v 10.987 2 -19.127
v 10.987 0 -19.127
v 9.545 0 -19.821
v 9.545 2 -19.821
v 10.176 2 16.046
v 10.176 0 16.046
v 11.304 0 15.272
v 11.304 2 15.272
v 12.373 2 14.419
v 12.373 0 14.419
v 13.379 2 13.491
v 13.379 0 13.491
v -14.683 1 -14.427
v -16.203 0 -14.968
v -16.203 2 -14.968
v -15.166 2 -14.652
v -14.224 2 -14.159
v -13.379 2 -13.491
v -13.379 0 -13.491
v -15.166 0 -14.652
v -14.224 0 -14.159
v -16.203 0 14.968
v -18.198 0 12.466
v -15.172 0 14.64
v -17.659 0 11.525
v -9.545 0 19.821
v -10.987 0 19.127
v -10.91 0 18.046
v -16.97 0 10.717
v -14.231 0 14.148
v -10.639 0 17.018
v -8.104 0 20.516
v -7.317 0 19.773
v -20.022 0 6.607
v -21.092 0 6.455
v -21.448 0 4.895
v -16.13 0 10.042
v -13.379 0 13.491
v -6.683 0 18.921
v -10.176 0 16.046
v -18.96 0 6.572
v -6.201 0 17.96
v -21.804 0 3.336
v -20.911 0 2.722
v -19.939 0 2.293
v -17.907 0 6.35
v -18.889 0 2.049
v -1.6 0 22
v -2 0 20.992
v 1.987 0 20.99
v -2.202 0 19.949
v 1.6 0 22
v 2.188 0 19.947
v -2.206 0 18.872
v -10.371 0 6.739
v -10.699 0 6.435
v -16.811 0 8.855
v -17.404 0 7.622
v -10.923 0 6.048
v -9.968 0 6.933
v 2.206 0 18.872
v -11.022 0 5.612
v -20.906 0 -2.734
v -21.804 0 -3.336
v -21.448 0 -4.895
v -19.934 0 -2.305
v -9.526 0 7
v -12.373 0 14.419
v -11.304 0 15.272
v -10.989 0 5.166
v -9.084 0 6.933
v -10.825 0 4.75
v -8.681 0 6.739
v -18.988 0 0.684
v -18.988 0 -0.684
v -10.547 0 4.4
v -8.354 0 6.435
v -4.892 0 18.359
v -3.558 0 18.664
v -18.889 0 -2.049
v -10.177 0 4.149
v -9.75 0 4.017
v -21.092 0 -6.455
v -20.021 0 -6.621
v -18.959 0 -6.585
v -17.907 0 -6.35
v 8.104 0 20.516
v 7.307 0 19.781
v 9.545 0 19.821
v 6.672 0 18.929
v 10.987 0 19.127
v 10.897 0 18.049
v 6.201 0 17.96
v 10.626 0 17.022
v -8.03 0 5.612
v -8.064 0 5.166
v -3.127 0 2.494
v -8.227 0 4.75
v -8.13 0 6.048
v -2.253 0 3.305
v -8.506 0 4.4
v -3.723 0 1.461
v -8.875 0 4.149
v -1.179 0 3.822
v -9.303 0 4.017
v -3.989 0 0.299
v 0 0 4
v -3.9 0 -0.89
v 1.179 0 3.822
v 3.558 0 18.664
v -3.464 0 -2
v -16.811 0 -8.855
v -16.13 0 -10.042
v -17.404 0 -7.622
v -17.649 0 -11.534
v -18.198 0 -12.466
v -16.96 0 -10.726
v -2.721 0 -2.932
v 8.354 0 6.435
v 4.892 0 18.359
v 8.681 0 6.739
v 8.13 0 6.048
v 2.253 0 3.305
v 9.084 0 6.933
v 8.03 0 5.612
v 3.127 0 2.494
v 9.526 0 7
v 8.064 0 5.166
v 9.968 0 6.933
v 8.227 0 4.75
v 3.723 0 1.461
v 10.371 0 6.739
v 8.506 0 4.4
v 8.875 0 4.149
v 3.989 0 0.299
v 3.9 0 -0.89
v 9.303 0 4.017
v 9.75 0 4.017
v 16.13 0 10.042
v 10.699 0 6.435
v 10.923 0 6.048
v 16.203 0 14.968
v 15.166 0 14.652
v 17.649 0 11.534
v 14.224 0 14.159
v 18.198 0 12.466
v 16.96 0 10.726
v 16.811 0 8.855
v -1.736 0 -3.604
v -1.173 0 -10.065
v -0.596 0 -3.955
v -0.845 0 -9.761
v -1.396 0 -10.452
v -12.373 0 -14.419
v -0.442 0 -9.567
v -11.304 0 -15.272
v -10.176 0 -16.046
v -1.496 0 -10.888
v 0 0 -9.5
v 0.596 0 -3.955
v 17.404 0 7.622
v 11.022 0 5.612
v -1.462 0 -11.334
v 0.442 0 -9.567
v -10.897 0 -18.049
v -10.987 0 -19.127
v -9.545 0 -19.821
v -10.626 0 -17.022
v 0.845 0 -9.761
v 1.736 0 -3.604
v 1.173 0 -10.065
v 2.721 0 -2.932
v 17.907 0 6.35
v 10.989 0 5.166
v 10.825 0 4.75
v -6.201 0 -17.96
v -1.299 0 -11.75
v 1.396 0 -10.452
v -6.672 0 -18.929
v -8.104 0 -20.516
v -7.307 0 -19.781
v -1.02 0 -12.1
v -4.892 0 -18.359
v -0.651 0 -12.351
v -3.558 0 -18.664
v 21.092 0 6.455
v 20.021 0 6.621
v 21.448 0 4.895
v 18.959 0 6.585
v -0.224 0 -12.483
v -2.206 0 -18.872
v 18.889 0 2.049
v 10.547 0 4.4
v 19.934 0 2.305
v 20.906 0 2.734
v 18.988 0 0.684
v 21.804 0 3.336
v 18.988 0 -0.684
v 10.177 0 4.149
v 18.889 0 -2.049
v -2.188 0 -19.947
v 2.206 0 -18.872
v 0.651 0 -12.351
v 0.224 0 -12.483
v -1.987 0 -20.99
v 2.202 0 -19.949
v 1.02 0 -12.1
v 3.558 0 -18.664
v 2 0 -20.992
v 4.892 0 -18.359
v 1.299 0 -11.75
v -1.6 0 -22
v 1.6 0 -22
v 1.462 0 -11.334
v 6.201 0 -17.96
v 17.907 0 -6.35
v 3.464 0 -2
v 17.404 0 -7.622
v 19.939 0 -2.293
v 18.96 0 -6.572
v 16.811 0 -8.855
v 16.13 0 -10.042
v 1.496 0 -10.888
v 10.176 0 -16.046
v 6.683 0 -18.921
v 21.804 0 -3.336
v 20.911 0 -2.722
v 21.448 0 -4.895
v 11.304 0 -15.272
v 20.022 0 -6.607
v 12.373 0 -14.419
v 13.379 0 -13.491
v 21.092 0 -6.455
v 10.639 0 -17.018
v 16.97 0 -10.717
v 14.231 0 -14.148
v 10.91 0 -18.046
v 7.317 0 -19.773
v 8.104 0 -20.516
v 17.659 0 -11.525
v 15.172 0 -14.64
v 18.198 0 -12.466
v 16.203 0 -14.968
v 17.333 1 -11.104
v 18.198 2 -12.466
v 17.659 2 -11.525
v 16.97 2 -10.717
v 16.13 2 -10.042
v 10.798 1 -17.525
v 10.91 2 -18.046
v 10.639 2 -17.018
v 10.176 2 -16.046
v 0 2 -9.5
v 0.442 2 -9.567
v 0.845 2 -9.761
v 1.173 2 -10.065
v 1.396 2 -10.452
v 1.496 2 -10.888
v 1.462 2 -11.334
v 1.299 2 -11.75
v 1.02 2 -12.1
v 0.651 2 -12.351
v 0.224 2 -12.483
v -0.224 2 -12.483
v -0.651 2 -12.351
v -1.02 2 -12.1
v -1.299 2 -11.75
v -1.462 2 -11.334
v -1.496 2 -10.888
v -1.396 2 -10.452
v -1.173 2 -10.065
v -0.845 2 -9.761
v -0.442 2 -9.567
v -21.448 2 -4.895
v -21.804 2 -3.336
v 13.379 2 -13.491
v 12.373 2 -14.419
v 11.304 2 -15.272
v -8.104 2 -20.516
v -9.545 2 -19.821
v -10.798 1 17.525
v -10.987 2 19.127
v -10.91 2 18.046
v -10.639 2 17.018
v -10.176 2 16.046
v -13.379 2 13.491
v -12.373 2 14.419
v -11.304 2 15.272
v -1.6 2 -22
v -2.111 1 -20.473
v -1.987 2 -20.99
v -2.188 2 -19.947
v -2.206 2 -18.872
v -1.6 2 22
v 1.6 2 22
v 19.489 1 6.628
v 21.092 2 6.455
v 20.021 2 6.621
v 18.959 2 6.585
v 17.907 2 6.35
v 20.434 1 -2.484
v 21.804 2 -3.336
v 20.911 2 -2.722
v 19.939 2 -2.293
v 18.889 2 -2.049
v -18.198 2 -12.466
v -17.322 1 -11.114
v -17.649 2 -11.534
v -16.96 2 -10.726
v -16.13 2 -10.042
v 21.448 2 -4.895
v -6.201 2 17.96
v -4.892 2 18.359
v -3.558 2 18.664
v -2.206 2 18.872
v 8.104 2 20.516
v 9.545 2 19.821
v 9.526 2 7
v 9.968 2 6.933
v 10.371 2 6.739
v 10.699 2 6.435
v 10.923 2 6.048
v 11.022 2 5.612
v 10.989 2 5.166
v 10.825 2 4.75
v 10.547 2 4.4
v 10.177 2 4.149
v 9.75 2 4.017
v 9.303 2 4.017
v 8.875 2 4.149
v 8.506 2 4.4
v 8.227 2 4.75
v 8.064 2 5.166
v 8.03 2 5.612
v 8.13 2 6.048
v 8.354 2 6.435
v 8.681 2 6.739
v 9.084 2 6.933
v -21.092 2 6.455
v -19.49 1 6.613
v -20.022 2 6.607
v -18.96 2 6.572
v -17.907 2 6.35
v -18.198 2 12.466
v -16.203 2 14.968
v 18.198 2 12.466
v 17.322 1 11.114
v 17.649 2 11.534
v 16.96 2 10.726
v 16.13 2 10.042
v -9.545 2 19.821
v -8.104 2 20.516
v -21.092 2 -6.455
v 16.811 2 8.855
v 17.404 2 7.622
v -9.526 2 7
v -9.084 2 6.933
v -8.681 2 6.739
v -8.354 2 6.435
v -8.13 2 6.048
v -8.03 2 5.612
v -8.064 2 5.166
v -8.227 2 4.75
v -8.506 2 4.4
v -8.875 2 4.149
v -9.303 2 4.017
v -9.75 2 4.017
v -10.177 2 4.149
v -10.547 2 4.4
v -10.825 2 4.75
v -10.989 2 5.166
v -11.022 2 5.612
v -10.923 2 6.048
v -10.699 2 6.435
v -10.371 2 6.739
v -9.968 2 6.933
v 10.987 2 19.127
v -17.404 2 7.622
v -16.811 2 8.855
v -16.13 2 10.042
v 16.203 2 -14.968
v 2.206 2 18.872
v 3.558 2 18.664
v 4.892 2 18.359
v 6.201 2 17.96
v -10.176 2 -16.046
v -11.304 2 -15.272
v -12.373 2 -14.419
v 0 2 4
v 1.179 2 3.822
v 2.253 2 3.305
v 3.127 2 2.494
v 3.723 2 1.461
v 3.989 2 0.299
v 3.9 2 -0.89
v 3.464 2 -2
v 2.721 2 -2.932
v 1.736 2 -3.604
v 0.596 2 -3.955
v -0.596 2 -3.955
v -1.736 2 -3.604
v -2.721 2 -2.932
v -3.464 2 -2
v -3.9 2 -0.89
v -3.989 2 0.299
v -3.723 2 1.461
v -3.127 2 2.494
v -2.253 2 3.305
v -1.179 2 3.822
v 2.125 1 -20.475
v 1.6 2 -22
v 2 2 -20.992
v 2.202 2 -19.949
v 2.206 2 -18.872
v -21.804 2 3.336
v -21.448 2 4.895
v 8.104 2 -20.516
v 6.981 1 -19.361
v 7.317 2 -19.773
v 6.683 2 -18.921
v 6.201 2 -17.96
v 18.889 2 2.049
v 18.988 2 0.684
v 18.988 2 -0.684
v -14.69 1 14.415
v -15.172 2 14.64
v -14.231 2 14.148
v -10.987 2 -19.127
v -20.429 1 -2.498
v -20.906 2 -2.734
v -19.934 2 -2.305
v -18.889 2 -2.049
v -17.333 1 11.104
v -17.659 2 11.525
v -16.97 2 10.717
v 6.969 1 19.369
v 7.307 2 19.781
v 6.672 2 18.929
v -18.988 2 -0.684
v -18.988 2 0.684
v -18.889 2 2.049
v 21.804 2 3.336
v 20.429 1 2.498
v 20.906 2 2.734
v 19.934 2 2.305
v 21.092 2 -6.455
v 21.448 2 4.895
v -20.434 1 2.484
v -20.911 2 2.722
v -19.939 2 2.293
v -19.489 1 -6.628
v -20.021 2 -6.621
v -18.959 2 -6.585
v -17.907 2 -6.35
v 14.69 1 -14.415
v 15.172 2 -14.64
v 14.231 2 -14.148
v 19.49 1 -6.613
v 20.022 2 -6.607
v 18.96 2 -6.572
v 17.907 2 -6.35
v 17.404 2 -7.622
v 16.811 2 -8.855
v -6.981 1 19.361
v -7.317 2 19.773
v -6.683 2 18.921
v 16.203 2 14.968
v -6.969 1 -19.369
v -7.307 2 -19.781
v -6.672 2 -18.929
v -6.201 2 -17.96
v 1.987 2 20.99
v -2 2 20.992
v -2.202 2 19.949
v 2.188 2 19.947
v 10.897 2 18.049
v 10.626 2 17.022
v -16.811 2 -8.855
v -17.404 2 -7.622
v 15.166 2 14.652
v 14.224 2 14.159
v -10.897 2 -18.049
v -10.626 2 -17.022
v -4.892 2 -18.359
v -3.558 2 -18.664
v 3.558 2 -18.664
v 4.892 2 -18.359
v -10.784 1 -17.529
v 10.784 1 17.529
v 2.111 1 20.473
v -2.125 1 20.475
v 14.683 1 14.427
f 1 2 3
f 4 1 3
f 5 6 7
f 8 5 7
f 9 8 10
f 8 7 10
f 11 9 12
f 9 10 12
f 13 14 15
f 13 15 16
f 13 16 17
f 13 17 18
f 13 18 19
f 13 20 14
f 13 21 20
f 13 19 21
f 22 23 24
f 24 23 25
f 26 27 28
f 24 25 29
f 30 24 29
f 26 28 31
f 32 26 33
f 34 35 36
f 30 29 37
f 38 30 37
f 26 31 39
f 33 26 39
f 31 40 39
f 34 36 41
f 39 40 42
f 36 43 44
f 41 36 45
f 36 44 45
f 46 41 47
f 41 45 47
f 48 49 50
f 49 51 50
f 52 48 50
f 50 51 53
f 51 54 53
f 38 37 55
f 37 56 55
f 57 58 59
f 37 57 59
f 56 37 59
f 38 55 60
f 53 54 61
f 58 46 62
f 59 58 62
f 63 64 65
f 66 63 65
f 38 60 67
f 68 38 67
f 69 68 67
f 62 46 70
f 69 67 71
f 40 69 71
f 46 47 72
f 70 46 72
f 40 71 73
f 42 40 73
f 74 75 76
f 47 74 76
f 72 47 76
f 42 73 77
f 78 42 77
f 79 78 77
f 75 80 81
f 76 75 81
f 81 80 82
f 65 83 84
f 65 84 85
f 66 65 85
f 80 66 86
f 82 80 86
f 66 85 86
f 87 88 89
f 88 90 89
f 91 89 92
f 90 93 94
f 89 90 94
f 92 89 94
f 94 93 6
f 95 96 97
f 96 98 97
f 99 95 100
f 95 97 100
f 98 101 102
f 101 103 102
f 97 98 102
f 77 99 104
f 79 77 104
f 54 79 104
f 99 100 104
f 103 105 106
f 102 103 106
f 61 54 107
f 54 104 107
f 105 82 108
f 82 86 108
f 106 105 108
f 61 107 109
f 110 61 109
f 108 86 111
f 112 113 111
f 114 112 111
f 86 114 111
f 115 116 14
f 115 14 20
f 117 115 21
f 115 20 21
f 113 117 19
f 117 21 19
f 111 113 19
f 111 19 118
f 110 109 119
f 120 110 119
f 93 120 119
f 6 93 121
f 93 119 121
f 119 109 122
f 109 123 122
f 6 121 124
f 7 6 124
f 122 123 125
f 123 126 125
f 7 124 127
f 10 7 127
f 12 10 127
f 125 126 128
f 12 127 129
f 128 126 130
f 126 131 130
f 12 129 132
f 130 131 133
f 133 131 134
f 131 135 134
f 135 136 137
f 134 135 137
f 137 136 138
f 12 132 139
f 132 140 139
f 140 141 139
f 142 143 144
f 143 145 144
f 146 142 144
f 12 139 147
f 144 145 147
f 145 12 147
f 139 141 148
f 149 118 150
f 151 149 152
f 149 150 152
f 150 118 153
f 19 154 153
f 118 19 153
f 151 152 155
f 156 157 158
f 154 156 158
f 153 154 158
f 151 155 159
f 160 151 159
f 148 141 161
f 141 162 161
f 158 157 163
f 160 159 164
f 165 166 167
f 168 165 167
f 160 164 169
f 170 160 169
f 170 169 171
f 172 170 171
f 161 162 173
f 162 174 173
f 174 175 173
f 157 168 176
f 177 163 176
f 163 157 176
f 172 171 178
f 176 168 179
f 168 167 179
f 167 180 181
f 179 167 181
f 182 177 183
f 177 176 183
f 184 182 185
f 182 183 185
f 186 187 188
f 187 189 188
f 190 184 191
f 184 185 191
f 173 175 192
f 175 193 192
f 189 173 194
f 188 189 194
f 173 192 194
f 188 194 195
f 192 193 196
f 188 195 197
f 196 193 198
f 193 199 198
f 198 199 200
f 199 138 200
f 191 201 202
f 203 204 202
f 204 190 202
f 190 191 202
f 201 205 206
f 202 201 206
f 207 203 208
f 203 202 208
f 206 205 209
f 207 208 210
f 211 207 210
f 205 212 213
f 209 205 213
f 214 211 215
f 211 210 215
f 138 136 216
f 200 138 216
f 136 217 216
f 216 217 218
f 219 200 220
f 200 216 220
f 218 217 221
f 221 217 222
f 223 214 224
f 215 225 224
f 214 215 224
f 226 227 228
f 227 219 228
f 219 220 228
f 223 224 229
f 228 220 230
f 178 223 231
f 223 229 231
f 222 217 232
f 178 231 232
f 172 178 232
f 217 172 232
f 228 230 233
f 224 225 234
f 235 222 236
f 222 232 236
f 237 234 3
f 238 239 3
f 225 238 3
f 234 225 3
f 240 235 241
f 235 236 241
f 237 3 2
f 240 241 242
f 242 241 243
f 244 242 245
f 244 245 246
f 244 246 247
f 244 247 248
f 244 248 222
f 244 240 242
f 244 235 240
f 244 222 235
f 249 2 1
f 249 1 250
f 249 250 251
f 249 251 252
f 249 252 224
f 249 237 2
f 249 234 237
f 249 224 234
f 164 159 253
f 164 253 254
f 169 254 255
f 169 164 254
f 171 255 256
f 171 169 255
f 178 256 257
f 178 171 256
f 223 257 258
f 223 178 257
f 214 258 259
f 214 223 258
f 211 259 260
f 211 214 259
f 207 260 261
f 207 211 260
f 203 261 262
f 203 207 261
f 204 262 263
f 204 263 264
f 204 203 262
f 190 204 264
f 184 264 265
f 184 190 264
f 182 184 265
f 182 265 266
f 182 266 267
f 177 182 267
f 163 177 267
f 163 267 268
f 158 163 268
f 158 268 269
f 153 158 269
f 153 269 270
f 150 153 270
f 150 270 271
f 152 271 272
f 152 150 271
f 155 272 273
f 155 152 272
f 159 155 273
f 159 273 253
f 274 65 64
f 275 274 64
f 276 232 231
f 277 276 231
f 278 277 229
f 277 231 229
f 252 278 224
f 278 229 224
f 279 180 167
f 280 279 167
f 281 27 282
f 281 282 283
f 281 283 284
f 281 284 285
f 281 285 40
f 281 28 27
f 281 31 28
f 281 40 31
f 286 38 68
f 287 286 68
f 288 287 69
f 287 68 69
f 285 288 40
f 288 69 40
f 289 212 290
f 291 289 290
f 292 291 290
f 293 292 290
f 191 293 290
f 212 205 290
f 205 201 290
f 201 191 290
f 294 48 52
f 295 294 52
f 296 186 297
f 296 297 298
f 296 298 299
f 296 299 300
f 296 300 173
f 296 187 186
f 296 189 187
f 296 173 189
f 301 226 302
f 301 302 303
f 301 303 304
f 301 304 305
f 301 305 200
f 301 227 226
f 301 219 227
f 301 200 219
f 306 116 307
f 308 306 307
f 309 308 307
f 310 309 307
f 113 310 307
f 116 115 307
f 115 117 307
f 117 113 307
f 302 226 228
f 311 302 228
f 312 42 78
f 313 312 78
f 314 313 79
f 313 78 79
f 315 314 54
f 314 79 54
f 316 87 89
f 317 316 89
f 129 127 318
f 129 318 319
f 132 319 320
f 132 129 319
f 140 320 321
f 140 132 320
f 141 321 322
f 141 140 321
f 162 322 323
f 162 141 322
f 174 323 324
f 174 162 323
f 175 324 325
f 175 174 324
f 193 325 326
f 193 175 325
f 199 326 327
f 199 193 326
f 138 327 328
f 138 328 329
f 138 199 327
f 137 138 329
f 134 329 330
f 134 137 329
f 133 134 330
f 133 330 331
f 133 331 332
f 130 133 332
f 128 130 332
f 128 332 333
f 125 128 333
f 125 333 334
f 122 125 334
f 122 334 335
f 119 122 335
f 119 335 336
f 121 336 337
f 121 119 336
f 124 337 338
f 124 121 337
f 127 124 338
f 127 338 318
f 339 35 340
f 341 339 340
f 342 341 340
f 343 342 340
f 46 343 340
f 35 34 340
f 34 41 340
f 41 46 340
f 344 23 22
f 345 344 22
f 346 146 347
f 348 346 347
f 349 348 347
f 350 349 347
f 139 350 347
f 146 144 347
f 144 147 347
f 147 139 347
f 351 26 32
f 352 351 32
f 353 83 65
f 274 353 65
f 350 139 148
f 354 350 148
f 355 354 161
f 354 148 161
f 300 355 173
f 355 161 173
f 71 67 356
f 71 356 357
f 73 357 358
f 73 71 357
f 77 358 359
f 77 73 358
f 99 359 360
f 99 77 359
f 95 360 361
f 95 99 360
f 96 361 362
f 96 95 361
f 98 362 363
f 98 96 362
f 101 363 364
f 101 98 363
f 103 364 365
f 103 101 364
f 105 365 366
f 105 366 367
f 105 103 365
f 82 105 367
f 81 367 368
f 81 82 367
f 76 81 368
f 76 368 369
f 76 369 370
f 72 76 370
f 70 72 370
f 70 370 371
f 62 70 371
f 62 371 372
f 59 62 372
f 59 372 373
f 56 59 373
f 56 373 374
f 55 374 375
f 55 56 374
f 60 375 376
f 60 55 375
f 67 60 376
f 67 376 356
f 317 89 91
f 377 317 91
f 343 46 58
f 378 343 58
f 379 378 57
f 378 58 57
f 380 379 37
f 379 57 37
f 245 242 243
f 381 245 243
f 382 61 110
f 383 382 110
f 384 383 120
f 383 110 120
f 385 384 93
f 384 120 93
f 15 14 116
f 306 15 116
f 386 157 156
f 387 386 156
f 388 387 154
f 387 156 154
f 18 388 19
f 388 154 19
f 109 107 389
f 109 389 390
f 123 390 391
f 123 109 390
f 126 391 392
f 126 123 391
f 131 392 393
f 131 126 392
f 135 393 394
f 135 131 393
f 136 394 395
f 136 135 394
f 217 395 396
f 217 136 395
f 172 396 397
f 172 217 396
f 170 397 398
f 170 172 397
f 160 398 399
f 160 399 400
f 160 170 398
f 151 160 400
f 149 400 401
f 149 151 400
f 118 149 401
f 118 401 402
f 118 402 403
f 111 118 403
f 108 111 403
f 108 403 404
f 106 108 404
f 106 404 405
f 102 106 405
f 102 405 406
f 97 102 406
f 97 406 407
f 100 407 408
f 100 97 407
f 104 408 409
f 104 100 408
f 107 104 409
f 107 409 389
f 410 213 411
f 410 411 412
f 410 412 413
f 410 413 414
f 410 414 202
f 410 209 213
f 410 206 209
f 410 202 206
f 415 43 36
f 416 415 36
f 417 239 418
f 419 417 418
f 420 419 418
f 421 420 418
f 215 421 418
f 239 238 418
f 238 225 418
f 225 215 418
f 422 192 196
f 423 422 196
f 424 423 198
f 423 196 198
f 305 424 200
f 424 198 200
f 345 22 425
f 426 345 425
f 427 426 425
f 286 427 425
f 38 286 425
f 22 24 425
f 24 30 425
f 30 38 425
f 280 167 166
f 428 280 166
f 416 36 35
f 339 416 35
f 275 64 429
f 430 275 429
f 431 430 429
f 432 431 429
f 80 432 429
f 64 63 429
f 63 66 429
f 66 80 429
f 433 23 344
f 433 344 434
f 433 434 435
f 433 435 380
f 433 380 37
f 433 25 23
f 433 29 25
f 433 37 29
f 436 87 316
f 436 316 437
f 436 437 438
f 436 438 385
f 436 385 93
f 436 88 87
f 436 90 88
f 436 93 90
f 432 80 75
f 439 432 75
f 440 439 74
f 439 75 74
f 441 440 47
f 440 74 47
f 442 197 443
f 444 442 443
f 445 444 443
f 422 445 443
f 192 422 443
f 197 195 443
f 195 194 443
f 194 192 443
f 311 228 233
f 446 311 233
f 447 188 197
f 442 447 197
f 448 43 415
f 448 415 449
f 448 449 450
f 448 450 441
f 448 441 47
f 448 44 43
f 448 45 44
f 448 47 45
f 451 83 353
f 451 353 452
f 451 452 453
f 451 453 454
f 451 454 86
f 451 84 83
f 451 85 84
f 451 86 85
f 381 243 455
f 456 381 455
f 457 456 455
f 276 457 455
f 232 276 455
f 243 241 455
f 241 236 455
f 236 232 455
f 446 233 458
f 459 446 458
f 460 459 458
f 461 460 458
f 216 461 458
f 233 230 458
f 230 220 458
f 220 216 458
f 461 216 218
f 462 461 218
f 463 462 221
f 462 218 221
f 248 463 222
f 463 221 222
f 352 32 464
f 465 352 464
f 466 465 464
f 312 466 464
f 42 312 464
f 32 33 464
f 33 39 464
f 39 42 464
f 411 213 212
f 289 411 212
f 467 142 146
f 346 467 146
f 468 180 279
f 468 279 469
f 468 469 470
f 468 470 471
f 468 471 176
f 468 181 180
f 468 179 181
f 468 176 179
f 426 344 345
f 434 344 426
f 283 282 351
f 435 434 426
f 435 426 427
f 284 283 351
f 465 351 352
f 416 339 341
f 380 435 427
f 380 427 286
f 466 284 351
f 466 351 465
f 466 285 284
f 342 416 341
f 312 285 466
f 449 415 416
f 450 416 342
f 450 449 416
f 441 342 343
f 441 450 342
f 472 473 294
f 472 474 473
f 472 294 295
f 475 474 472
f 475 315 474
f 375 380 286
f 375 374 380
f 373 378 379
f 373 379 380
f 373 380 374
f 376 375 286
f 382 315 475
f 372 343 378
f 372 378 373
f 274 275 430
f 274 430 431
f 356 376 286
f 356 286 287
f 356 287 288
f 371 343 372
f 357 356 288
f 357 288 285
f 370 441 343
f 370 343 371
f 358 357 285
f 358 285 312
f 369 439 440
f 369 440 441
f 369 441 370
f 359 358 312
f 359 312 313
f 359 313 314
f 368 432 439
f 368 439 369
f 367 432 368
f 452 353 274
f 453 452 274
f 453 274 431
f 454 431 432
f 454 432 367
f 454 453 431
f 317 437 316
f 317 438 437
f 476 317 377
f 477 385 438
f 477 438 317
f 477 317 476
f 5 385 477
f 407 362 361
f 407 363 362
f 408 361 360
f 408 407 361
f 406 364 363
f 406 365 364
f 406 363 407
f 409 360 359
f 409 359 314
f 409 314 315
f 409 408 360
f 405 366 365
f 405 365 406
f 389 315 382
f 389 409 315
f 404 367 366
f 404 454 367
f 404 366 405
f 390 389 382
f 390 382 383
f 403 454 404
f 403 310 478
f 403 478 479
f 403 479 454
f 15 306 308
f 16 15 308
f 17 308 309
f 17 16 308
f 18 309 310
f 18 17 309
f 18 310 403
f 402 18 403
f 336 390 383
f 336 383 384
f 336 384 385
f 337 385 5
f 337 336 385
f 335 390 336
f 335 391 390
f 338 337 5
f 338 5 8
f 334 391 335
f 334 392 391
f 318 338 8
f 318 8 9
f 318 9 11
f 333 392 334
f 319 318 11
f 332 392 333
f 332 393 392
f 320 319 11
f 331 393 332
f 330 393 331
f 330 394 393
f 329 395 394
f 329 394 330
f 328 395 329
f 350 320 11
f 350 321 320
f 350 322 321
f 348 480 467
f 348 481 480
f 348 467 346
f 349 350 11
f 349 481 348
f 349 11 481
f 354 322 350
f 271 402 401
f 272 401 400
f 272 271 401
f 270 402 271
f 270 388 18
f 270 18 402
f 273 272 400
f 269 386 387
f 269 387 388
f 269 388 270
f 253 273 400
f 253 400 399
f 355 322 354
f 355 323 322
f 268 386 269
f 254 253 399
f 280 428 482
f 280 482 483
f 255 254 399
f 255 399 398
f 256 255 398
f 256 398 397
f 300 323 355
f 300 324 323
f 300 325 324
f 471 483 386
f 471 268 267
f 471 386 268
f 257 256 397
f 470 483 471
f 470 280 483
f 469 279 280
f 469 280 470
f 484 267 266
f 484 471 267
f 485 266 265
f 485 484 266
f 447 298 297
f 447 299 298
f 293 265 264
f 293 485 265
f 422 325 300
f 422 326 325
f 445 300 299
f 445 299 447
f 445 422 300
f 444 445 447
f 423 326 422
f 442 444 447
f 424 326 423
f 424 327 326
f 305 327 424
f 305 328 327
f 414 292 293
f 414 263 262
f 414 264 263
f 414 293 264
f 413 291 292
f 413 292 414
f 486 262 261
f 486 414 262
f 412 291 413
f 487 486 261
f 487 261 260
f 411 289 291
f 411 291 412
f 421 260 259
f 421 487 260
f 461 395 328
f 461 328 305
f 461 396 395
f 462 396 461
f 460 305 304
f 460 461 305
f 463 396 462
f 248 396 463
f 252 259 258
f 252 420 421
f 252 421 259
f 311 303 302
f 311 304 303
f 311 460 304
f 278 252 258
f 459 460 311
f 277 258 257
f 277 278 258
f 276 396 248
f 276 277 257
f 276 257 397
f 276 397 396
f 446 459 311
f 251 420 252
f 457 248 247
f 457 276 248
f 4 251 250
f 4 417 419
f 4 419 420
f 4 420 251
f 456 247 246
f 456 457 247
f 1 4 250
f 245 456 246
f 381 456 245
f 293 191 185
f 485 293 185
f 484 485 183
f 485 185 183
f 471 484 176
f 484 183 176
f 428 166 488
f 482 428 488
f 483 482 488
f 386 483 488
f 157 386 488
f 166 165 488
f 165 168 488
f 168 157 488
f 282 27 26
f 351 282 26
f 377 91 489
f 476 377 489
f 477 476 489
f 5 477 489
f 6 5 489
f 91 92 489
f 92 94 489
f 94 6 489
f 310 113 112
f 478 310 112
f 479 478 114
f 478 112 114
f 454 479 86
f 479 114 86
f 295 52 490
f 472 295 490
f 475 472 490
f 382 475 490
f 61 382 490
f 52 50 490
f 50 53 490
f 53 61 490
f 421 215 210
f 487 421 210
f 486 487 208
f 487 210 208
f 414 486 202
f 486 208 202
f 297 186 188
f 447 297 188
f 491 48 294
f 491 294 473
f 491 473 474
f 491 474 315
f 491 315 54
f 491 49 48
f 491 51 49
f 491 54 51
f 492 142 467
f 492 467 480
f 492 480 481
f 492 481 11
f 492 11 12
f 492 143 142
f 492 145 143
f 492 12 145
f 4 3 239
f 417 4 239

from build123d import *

# Parameters (mm, degrees)
SKETCH1_R           = 4
SKETCH1_R_2         = 1.5
BOSS_EXTRUDE1_DEPTH = 2


with BuildPart() as part:
    # Sketch1 → Boss-Extrude1 (new body)
    with BuildSketch(Plane(origin=(0, 0, 0), x_dir=(1, 0, 0), z_dir=(0, 1, 0))):
        with BuildLine():
            Line((0, 22), (-1.6, 22))
            add(Edge.make_bspline(
                [(-1.6, 22), (-2.318149564, 20.509493388), (-2.205951168, 18.871507079)],
                knots=[0, 0, 0, 1, 1, 1], degree=2))
            ThreePointArc((-2.205951168, 18.871507079), (-4.227897745, 18.523630331), (-6.200546728, 17.95976671))
            add(Edge.make_bspline(
                [(-8.103892072, 20.515529076), (-6.785743067, 19.501097309), (-6.200546728, 17.95976671)],
                knots=[0, 0, 0, 1, 1, 1], degree=2))
            Line((-8.103892072, 20.515529076), (-9.545442261, 19.821315094))
            Line((-9.545442261, 19.821315094), (-10.986992449, 19.127101111))
            add(Edge.make_bspline(
                [(-10.986992449, 19.127101111), (-10.987316267, 17.472607638), (-10.175533381, 16.045514028)],
                knots=[0, 0, 0, 1, 1, 1], degree=2))
            ThreePointArc((-10.175533381, 16.045514028), (-11.846306235, 14.854798167), (-13.3789503, 13.490874281))
            add(Edge.make_bspline(
                [(-16.202708931, 14.967706013), (-14.574952266, 14.62565799), (-13.3789503, 13.490874281)],
                knots=[0, 0, 0, 1, 1, 1], degree=2))
            Line((-16.202708931, 14.967706013), (-17.200292614, 13.716775641))
            Line((-17.200292614, 13.716775641), (-18.197876297, 12.465845269))
            add(Edge.make_bspline(
                [(-18.197876297, 12.465845269), (-17.480310233, 10.975057658), (-16.129726413, 10.041510138)],
                knots=[0, 0, 0, 1, 1, 1], degree=2))
            ThreePointArc((-16.129726413, 10.041510138), (-17.11840849, 8.243791043), (-17.907488682, 6.349948747))
            add(Edge.make_bspline(
                [(-21.092380574, 6.455345207), (-19.477413419, 6.853427735), (-17.907488682, 6.349948747)],
                knots=[0, 0, 0, 1, 1, 1], degree=2))
            Line((-21.092380574, 6.455345207), (-21.448414068, 4.895460547))
            Line((-21.448414068, 4.895460547), (-21.804447562, 3.335575888))
            add(Edge.make_bspline(
                [(-21.804447562, 3.335575888), (-20.511114375, 2.303762909), (-18.889229311, 2.048662014)],
                knots=[0, 0, 0, 1, 1, 1], degree=2))
            ThreePointArc((-18.889229311, 2.048662014), (-19, 0), (-18.889229311, -2.048662014))
            add(Edge.make_bspline(
                [(-21.804447562, -3.335575888), (-20.522133969, -2.276207935), (-18.889229311, -2.048662014)],
                knots=[0, 0, 0, 1, 1, 1], degree=2))
            Line((-21.804447562, -3.335575888), (-21.448414068, -4.895460547))
            Line((-21.448414068, -4.895460547), (-21.092380574, -6.455345207))
            add(Edge.make_bspline(
                [(-21.092380574, -6.455345207), (-19.479440763, -6.823820339), (-17.907488682, -6.349948747)],
                knots=[0, 0, 0, 1, 1, 1], degree=2))
            ThreePointArc((-17.907488682, -6.349948747), (-17.11840849, -8.243791043), (-16.129726413, -10.041510138))
            add(Edge.make_bspline(
                [(-18.197876297, -12.465845269), (-17.502194199, -10.955012707), (-16.129726413, -10.041510138)],
                knots=[0, 0, 0, 1, 1, 1], degree=2))
            Line((-18.197876297, -12.465845269), (-17.200292614, -13.716775641))
            Line((-17.200292614, -13.716775641), (-16.202708931, -14.967706013))
            add(Edge.make_bspline(
                [(-16.202708931, -14.967706013), (-14.589625008, -14.599862279), (-13.3789503, -13.490874281)],
                knots=[0, 0, 0, 1, 1, 1], degree=2))
            ThreePointArc((-13.3789503, -13.490874281), (-11.846306235, -14.854798167), (-10.175533381, -16.045514028))
            add(Edge.make_bspline(
                [(-10.986992449, -19.127101111), (-11.015730218, -17.464042859), (-10.175533381, -16.045514028)],
                knots=[0, 0, 0, 1, 1, 1], degree=2))
            Line((-10.986992449, -19.127101111), (-9.545442261, -19.821315094))
            Line((-9.545442261, -19.821315094), (-8.103892072, -20.515529076))
            add(Edge.make_bspline(
                [(-8.103892072, -20.515529076), (-6.81015509, -19.48422244), (-6.200546728, -17.95976671)],
                knots=[0, 0, 0, 1, 1, 1], degree=2))
            ThreePointArc((-6.200546728, -17.95976671), (-4.227897745, -18.523630331), (-2.205951168, -18.871507079))
            add(Edge.make_bspline(
                [(-1.6, -22), (-2.347465768, -20.514105139), (-2.205951168, -18.871507079)],
                knots=[0, 0, 0, 1, 1, 1], degree=2))
            Line((-1.6, -22), (0, -22))
            Line((0, -22), (1.6, -22))
            add(Edge.make_bspline(
                [(1.6, -22), (2.318149564, -20.509493388), (2.205951168, -18.871507079)],
                knots=[0, 0, 0, 1, 1, 1], degree=2))
            ThreePointArc((2.205951168, -18.871507079), (4.227897745, -18.523630331), (6.200546728, -17.95976671))
            add(Edge.make_bspline(
                [(8.103892072, -20.515529076), (6.785743067, -19.501097309), (6.200546728, -17.95976671)],
                knots=[0, 0, 0, 1, 1, 1], degree=2))
            Line((8.103892072, -20.515529076), (9.545442261, -19.821315094))
            Line((9.545442261, -19.821315094), (10.986992449, -19.127101111))
            add(Edge.make_bspline(
                [(10.986992449, -19.127101111), (10.987316267, -17.472607638), (10.175533381, -16.045514028)],
                knots=[0, 0, 0, 1, 1, 1], degree=2))
            ThreePointArc((10.175533381, -16.045514028), (11.846306235, -14.854798167), (13.3789503, -13.490874281))
            add(Edge.make_bspline(
                [(16.202708931, -14.967706013), (14.574952266, -14.62565799), (13.3789503, -13.490874281)],
                knots=[0, 0, 0, 1, 1, 1], degree=2))
            Line((16.202708931, -14.967706013), (17.200292614, -13.716775641))
            Line((17.200292614, -13.716775641), (18.197876297, -12.465845269))
            add(Edge.make_bspline(
                [(18.197876297, -12.465845269), (17.480310233, -10.975057658), (16.129726413, -10.041510138)],
                knots=[0, 0, 0, 1, 1, 1], degree=2))
            ThreePointArc((16.129726413, -10.041510138), (17.11840849, -8.243791043), (17.907488682, -6.349948747))
            add(Edge.make_bspline(
                [(21.092380574, -6.455345207), (19.477413419, -6.853427735), (17.907488682, -6.349948747)],
                knots=[0, 0, 0, 1, 1, 1], degree=2))
            Line((21.092380574, -6.455345207), (21.448414068, -4.895460547))
            Line((21.448414068, -4.895460547), (21.804447562, -3.335575888))
            add(Edge.make_bspline(
                [(21.804447562, -3.335575888), (20.511114375, -2.303762909), (18.889229311, -2.048662014)],
                knots=[0, 0, 0, 1, 1, 1], degree=2))
            ThreePointArc((18.889229311, -2.048662014), (19, 0), (18.889229311, 2.048662014))
            add(Edge.make_bspline(
                [(21.804447562, 3.335575888), (20.522133969, 2.276207935), (18.889229311, 2.048662014)],
                knots=[0, 0, 0, 1, 1, 1], degree=2))
            Line((21.804447562, 3.335575888), (21.448414068, 4.895460547))
            Line((21.448414068, 4.895460547), (21.092380574, 6.455345207))
            add(Edge.make_bspline(
                [(21.092380574, 6.455345207), (19.479440763, 6.823820339), (17.907488682, 6.349948747)],
                knots=[0, 0, 0, 1, 1, 1], degree=2))
            ThreePointArc((17.907488682, 6.349948747), (17.11840849, 8.243791043), (16.129726413, 10.041510138))
            add(Edge.make_bspline(
                [(18.197876297, 12.465845269), (17.502194199, 10.955012707), (16.129726413, 10.041510138)],
                knots=[0, 0, 0, 1, 1, 1], degree=2))
            Line((18.197876297, 12.465845269), (17.200292614, 13.716775641))
            Line((17.200292614, 13.716775641), (16.202708931, 14.967706013))
            add(Edge.make_bspline(
                [(16.202708931, 14.967706013), (14.589625008, 14.599862279), (13.3789503, 13.490874281)],
                knots=[0, 0, 0, 1, 1, 1], degree=2))
            ThreePointArc((13.3789503, 13.490874281), (11.846306235, 14.854798167), (10.175533381, 16.045514028))
            add(Edge.make_bspline(
                [(10.986992449, 19.127101111), (11.015730218, 17.464042859), (10.175533381, 16.045514028)],
                knots=[0, 0, 0, 1, 1, 1], degree=2))
            Line((10.986992449, 19.127101111), (9.545442261, 19.821315094))
            Line((9.545442261, 19.821315094), (8.103892072, 20.515529076))
            add(Edge.make_bspline(
                [(8.103892072, 20.515529076), (6.81015509, 19.48422244), (6.200546728, 17.95976671)],
                knots=[0, 0, 0, 1, 1, 1], degree=2))
            ThreePointArc((6.200546728, 17.95976671), (4.227897745, 18.523630331), (2.205951168, 18.871507079))
            add(Edge.make_bspline(
                [(1.6, 22), (2.347465768, 20.514105139), (2.205951168, 18.871507079)],
                knots=[0, 0, 0, 1, 1, 1], degree=2))
            Line((1.6, 22), (0, 22))
        make_face()
        with Locations(Location((0, 0, 0), (0, 0, 270))):
            Circle(SKETCH1_R, mode=Mode.SUBTRACT)
        with Locations(Location((0, 11, 0), (0, 0, 270))):
            Circle(SKETCH1_R_2, mode=Mode.SUBTRACT)
        with Locations(Location((9.526279442, -5.5, 0), (0, 0, 270))):
            Circle(SKETCH1_R_2, mode=Mode.SUBTRACT)
        with Locations(Location((-9.526279442, -5.5, 0), (0, 0, 270))):
            Circle(SKETCH1_R_2, mode=Mode.SUBTRACT)
    extrude(amount=BOSS_EXTRUDE1_DEPTH)


solid = part.part
